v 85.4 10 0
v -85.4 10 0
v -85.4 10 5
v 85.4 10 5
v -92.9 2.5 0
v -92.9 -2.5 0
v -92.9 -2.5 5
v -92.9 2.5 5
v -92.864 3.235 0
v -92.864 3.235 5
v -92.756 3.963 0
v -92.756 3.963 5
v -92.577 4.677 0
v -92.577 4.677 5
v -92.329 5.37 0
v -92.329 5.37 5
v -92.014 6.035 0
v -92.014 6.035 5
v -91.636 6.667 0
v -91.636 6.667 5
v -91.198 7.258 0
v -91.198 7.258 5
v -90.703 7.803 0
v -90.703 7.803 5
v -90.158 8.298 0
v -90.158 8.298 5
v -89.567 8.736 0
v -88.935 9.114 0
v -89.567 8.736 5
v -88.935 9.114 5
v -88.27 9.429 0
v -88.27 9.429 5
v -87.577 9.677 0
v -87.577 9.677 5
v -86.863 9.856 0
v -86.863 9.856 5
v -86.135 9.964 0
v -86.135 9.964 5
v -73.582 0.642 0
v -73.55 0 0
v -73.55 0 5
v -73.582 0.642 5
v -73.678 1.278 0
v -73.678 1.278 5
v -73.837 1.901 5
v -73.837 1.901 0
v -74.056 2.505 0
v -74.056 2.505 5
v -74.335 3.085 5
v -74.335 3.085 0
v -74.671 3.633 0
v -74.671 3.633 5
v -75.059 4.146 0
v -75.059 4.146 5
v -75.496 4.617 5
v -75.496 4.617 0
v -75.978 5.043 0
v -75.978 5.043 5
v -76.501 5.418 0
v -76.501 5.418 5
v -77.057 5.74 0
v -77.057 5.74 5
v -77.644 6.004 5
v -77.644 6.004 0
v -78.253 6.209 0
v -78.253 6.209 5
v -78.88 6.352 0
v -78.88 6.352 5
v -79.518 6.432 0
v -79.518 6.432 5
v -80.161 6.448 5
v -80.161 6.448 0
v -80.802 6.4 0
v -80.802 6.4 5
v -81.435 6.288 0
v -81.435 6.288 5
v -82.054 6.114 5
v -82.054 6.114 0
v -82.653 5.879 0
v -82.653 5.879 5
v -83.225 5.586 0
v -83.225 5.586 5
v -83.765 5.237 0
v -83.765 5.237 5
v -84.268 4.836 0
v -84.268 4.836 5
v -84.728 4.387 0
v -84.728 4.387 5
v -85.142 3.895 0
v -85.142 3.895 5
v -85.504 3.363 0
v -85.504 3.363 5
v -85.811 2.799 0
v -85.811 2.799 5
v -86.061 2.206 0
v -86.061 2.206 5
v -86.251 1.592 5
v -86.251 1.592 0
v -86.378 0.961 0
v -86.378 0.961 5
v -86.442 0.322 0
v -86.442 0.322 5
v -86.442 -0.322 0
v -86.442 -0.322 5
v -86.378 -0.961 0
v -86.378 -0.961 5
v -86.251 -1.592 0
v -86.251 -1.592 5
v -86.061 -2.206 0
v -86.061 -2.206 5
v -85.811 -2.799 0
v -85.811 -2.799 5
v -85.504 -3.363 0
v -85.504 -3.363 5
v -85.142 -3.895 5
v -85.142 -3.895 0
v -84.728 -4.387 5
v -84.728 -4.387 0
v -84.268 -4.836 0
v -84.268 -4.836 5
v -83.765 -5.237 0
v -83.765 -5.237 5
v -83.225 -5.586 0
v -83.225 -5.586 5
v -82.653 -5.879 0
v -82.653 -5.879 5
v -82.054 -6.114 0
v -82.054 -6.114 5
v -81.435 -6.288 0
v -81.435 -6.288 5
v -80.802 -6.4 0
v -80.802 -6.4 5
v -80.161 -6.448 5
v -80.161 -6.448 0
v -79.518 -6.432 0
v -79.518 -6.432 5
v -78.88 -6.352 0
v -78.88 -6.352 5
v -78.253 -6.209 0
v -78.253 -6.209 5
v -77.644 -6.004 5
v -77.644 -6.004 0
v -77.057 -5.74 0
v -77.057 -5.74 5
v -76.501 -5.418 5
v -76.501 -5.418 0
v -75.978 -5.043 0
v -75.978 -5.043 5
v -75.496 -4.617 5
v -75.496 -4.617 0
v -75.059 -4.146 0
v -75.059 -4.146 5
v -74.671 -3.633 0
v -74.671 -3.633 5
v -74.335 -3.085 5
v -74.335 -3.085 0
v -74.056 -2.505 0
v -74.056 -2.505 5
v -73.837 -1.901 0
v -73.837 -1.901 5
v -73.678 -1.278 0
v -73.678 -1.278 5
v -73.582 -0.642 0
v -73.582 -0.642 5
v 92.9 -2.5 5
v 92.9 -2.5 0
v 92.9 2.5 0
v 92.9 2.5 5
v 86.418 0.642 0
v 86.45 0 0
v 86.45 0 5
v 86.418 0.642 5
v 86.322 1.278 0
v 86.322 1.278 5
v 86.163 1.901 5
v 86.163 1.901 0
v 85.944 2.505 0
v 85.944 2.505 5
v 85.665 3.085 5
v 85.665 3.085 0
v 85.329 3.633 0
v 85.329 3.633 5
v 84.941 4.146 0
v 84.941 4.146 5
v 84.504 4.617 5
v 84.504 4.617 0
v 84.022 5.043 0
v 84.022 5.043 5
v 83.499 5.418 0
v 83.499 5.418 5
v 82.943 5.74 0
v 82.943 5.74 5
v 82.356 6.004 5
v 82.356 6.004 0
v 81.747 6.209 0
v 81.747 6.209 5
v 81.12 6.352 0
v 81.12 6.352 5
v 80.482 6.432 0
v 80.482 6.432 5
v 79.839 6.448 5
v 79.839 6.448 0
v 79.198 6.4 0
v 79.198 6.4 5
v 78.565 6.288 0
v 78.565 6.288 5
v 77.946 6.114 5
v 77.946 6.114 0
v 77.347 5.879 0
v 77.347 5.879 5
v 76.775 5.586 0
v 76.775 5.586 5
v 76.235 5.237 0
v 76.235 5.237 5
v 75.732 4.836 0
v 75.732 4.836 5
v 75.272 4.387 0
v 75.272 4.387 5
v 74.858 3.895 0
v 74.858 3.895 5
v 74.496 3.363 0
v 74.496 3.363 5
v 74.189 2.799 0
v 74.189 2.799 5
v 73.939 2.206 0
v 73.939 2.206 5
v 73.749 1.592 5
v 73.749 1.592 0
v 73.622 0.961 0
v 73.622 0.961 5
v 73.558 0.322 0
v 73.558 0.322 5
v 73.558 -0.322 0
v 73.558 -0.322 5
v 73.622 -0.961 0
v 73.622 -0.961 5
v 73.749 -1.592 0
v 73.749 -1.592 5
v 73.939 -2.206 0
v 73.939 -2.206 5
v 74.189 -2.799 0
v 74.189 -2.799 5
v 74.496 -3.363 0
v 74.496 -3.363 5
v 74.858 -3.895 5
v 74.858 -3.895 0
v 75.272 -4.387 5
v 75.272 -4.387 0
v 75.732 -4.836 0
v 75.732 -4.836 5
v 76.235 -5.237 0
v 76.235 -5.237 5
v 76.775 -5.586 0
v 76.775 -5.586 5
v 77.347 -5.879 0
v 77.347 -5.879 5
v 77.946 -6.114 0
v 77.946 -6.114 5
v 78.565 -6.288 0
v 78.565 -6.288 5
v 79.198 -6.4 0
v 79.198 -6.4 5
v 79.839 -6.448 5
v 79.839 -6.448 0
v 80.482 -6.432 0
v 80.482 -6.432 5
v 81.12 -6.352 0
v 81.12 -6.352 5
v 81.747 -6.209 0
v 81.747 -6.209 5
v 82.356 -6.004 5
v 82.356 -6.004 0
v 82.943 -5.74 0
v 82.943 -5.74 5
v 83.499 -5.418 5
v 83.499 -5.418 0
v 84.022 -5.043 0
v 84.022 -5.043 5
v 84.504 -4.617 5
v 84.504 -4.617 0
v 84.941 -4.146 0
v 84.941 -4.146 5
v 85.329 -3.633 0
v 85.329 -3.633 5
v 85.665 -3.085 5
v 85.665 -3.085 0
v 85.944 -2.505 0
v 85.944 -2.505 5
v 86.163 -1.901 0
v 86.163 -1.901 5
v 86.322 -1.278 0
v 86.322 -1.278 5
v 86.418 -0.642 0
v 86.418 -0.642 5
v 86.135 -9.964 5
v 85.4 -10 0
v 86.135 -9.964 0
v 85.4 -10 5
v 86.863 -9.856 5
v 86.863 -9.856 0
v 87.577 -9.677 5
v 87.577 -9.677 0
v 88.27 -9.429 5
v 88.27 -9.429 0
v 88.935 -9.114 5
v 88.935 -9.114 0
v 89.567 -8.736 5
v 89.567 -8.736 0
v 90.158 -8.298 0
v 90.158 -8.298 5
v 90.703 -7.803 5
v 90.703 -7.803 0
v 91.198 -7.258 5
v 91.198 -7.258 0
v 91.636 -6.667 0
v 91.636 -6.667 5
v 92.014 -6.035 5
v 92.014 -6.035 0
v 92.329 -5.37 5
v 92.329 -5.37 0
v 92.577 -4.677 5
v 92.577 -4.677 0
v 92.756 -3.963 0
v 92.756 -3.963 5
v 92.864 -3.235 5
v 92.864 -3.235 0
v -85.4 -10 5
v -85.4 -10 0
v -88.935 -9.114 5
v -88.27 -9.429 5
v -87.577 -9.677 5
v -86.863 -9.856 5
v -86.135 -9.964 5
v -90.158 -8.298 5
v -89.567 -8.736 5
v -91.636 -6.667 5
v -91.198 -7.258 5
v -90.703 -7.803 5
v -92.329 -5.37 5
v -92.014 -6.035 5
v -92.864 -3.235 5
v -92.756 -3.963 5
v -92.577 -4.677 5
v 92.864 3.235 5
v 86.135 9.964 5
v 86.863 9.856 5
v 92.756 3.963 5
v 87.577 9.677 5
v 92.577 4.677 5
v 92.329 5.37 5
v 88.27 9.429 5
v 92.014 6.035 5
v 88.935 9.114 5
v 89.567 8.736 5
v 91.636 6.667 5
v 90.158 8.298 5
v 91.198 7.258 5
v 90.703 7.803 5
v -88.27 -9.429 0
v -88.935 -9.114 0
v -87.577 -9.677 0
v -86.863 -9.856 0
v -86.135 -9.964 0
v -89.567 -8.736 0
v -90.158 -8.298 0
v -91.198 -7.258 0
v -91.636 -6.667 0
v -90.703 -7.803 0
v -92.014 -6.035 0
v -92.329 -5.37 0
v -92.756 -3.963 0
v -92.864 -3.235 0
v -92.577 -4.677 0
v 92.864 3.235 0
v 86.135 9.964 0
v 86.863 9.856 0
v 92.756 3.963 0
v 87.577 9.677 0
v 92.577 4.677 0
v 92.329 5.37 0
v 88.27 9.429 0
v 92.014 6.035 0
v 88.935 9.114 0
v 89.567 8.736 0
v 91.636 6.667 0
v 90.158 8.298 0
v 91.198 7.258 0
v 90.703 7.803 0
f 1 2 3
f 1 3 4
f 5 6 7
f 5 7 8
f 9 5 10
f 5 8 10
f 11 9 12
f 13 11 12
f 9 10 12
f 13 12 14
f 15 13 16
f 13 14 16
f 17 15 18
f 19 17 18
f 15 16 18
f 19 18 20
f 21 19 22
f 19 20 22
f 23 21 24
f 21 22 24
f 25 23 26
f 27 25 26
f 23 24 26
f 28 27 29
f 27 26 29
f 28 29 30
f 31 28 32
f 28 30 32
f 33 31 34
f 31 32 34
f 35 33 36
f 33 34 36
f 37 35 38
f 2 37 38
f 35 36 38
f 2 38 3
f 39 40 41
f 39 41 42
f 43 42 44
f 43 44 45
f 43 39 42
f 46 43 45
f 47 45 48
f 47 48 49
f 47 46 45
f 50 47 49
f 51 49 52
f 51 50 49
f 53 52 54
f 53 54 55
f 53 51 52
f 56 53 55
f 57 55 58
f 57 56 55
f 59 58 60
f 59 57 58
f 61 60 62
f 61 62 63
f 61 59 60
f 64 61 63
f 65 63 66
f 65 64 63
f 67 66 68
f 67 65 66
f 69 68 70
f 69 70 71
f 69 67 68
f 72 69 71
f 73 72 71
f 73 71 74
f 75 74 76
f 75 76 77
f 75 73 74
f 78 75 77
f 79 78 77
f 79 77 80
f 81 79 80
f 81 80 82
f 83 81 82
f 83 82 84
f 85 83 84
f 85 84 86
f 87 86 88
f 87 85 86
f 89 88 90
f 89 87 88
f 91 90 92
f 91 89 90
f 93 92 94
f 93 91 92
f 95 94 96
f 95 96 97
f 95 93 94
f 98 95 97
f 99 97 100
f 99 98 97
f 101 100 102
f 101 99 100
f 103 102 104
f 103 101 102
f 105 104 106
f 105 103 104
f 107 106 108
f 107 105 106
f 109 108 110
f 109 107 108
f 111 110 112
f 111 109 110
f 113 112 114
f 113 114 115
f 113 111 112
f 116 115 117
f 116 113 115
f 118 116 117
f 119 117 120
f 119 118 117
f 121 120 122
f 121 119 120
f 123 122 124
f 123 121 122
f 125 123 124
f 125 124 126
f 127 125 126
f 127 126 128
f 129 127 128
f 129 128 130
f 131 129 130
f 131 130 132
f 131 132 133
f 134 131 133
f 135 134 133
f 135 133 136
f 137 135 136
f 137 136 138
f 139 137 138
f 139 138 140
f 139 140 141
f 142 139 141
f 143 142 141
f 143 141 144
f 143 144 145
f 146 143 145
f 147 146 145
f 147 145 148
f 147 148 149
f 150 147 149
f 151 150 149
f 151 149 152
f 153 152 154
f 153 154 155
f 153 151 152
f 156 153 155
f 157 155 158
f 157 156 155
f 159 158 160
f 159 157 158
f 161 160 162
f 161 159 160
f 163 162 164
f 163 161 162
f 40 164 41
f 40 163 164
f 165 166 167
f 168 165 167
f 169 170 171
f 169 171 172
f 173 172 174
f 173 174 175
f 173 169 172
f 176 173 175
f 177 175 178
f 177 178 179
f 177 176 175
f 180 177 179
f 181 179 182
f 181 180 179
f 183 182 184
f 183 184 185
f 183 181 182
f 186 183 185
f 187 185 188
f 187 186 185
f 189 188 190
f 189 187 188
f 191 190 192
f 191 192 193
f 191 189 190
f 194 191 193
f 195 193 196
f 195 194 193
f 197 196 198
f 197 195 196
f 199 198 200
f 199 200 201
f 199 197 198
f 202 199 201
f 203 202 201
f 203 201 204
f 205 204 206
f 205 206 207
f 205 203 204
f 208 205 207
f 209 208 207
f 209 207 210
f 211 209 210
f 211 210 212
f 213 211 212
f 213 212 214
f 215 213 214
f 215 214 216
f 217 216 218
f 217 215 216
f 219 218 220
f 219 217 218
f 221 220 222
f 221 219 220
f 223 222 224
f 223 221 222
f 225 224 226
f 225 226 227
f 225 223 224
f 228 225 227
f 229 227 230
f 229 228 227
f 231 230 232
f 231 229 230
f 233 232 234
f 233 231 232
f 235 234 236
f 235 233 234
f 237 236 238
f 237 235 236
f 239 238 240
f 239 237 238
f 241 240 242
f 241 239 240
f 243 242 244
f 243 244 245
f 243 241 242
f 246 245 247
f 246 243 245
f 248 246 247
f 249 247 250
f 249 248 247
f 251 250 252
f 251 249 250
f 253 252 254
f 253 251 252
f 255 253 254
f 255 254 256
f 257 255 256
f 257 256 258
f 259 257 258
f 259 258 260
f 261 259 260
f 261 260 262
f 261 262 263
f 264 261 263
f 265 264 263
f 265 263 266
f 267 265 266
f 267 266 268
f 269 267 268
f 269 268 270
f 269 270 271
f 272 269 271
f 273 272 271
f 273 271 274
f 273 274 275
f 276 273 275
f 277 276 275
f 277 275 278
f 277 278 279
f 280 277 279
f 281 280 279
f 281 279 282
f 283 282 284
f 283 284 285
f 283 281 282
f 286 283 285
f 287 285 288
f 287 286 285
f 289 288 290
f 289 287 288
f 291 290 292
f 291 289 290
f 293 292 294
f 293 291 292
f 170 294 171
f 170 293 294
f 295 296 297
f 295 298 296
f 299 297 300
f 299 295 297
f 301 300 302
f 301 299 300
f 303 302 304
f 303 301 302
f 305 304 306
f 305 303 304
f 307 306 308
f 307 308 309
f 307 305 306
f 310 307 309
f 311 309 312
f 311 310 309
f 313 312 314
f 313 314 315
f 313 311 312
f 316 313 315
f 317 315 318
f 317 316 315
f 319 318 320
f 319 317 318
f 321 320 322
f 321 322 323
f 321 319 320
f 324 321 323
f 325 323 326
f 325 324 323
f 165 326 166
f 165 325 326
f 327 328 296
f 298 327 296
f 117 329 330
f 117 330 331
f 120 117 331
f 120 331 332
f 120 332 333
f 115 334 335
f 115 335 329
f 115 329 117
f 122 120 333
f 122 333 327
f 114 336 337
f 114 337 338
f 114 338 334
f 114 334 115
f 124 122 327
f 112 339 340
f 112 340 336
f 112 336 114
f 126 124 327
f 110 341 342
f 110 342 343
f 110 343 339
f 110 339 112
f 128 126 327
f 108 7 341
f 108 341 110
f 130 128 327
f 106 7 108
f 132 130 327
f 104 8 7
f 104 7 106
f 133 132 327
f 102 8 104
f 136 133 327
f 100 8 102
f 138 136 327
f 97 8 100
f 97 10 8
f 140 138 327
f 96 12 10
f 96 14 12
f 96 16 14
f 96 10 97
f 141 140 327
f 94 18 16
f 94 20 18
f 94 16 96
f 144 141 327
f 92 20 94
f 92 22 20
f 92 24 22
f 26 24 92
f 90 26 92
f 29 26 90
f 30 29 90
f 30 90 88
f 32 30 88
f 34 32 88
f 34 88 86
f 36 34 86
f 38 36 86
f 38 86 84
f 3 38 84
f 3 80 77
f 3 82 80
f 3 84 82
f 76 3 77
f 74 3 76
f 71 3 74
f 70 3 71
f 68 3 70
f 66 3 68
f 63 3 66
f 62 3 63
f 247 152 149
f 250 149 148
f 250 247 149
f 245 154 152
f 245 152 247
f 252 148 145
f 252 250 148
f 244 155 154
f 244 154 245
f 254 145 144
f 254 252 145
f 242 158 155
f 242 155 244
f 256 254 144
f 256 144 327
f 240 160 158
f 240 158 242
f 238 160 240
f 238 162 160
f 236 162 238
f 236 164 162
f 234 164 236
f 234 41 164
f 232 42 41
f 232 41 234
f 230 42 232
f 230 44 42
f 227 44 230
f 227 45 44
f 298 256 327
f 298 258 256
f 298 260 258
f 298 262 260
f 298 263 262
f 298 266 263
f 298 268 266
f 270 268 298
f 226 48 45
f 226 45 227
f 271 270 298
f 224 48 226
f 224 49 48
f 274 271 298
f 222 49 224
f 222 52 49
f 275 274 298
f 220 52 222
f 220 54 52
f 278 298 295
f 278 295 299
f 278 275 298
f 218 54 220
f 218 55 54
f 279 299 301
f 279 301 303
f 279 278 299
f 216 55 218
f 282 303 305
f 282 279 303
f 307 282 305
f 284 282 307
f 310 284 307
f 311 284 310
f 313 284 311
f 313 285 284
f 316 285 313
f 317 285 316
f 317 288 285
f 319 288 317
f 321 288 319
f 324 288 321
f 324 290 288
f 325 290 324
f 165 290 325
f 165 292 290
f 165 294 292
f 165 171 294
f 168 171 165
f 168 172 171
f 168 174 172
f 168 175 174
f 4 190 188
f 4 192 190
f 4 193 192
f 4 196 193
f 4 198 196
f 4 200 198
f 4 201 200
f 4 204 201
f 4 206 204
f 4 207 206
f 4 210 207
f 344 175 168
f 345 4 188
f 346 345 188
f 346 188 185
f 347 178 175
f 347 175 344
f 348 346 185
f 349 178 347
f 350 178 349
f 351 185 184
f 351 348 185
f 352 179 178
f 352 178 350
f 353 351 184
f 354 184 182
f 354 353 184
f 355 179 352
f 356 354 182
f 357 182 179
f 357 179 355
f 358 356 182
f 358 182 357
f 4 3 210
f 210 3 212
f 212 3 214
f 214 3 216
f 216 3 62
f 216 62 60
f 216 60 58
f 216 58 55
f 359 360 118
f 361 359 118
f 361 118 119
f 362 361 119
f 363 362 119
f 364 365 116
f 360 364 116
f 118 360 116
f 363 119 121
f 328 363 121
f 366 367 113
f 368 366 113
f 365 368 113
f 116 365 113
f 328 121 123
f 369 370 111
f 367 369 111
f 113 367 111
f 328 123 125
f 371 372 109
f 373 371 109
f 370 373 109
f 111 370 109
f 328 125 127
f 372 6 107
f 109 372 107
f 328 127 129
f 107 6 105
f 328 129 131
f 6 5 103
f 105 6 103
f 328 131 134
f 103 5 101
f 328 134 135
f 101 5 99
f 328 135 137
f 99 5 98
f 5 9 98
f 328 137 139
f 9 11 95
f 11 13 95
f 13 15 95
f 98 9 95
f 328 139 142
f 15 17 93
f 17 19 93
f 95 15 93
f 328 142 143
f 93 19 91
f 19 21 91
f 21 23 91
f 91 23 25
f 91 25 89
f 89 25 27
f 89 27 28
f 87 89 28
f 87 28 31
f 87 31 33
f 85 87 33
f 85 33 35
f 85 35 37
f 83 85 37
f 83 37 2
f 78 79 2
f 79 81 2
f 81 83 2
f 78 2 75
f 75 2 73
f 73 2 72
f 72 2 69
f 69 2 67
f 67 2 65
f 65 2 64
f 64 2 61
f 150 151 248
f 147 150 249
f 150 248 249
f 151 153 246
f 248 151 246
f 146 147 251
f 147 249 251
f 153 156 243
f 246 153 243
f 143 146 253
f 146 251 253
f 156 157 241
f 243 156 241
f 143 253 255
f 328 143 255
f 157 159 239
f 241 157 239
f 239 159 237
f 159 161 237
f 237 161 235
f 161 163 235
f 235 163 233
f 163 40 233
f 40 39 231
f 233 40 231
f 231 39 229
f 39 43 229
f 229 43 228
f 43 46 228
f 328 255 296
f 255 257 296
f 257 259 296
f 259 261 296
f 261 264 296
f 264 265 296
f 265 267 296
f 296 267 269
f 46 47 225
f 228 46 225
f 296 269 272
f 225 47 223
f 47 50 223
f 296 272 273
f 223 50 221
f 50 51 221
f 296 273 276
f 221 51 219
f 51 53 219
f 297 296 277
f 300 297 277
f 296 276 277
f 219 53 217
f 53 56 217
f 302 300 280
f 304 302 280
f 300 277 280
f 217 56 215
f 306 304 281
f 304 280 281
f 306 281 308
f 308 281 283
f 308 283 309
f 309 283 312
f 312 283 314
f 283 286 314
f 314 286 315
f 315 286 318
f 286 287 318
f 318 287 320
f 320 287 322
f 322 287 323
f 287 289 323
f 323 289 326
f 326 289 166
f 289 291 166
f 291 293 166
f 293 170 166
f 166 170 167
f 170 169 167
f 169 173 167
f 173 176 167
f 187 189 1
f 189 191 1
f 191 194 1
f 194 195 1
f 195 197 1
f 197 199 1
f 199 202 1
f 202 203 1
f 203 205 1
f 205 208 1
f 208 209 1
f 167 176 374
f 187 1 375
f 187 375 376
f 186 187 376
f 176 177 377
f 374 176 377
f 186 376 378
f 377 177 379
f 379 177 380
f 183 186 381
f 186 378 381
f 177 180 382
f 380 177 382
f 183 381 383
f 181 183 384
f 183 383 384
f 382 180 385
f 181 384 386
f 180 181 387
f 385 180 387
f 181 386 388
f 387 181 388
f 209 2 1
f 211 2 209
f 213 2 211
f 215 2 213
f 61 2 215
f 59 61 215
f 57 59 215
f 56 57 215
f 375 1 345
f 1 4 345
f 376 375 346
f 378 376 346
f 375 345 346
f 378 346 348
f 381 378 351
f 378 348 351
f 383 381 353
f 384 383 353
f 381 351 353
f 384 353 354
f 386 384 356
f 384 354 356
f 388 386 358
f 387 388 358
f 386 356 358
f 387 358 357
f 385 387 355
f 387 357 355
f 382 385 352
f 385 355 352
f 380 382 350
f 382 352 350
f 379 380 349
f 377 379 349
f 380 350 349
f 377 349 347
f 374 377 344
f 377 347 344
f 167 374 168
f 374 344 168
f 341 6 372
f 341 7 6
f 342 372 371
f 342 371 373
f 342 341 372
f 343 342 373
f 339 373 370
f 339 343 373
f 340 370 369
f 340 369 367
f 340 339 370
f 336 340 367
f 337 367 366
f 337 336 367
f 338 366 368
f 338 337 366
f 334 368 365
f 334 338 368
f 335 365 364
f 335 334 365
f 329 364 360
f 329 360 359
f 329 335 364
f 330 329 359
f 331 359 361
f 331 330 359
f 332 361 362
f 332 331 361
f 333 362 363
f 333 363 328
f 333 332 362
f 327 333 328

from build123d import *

# Parameters (mm, degrees)
SKETCH1_W           = 185.8
SKETCH1_H           = 20
SKETCH1_R           = 6.45
BOSS_EXTRUDE1_DEPTH = 5
FILLET1_R           = 7.5


with BuildPart() as part:
    # Sketch1 → Boss-Extrude1 (new body)
    with BuildSketch(Plane.XY):
        Rectangle(SKETCH1_W, SKETCH1_H)
        with Locations((-80, 0)):
            Circle(SKETCH1_R, mode=Mode.SUBTRACT)
        with Locations((80, 0)):
            Circle(SKETCH1_R, mode=Mode.SUBTRACT)
    extrude(amount=BOSS_EXTRUDE1_DEPTH)

    # Fillet1
    fillet1_edges = [part.edges().sort_by_distance(p)[0] for p in [
        (-92.9, 10, 2.5),
        (92.9, 10, 2.5),
        (92.9, -10, 2.5),
        (-92.9, -10, 2.5),
    ]]
    fillet(fillet1_edges, radius=FILLET1_R)


solid = part.part
